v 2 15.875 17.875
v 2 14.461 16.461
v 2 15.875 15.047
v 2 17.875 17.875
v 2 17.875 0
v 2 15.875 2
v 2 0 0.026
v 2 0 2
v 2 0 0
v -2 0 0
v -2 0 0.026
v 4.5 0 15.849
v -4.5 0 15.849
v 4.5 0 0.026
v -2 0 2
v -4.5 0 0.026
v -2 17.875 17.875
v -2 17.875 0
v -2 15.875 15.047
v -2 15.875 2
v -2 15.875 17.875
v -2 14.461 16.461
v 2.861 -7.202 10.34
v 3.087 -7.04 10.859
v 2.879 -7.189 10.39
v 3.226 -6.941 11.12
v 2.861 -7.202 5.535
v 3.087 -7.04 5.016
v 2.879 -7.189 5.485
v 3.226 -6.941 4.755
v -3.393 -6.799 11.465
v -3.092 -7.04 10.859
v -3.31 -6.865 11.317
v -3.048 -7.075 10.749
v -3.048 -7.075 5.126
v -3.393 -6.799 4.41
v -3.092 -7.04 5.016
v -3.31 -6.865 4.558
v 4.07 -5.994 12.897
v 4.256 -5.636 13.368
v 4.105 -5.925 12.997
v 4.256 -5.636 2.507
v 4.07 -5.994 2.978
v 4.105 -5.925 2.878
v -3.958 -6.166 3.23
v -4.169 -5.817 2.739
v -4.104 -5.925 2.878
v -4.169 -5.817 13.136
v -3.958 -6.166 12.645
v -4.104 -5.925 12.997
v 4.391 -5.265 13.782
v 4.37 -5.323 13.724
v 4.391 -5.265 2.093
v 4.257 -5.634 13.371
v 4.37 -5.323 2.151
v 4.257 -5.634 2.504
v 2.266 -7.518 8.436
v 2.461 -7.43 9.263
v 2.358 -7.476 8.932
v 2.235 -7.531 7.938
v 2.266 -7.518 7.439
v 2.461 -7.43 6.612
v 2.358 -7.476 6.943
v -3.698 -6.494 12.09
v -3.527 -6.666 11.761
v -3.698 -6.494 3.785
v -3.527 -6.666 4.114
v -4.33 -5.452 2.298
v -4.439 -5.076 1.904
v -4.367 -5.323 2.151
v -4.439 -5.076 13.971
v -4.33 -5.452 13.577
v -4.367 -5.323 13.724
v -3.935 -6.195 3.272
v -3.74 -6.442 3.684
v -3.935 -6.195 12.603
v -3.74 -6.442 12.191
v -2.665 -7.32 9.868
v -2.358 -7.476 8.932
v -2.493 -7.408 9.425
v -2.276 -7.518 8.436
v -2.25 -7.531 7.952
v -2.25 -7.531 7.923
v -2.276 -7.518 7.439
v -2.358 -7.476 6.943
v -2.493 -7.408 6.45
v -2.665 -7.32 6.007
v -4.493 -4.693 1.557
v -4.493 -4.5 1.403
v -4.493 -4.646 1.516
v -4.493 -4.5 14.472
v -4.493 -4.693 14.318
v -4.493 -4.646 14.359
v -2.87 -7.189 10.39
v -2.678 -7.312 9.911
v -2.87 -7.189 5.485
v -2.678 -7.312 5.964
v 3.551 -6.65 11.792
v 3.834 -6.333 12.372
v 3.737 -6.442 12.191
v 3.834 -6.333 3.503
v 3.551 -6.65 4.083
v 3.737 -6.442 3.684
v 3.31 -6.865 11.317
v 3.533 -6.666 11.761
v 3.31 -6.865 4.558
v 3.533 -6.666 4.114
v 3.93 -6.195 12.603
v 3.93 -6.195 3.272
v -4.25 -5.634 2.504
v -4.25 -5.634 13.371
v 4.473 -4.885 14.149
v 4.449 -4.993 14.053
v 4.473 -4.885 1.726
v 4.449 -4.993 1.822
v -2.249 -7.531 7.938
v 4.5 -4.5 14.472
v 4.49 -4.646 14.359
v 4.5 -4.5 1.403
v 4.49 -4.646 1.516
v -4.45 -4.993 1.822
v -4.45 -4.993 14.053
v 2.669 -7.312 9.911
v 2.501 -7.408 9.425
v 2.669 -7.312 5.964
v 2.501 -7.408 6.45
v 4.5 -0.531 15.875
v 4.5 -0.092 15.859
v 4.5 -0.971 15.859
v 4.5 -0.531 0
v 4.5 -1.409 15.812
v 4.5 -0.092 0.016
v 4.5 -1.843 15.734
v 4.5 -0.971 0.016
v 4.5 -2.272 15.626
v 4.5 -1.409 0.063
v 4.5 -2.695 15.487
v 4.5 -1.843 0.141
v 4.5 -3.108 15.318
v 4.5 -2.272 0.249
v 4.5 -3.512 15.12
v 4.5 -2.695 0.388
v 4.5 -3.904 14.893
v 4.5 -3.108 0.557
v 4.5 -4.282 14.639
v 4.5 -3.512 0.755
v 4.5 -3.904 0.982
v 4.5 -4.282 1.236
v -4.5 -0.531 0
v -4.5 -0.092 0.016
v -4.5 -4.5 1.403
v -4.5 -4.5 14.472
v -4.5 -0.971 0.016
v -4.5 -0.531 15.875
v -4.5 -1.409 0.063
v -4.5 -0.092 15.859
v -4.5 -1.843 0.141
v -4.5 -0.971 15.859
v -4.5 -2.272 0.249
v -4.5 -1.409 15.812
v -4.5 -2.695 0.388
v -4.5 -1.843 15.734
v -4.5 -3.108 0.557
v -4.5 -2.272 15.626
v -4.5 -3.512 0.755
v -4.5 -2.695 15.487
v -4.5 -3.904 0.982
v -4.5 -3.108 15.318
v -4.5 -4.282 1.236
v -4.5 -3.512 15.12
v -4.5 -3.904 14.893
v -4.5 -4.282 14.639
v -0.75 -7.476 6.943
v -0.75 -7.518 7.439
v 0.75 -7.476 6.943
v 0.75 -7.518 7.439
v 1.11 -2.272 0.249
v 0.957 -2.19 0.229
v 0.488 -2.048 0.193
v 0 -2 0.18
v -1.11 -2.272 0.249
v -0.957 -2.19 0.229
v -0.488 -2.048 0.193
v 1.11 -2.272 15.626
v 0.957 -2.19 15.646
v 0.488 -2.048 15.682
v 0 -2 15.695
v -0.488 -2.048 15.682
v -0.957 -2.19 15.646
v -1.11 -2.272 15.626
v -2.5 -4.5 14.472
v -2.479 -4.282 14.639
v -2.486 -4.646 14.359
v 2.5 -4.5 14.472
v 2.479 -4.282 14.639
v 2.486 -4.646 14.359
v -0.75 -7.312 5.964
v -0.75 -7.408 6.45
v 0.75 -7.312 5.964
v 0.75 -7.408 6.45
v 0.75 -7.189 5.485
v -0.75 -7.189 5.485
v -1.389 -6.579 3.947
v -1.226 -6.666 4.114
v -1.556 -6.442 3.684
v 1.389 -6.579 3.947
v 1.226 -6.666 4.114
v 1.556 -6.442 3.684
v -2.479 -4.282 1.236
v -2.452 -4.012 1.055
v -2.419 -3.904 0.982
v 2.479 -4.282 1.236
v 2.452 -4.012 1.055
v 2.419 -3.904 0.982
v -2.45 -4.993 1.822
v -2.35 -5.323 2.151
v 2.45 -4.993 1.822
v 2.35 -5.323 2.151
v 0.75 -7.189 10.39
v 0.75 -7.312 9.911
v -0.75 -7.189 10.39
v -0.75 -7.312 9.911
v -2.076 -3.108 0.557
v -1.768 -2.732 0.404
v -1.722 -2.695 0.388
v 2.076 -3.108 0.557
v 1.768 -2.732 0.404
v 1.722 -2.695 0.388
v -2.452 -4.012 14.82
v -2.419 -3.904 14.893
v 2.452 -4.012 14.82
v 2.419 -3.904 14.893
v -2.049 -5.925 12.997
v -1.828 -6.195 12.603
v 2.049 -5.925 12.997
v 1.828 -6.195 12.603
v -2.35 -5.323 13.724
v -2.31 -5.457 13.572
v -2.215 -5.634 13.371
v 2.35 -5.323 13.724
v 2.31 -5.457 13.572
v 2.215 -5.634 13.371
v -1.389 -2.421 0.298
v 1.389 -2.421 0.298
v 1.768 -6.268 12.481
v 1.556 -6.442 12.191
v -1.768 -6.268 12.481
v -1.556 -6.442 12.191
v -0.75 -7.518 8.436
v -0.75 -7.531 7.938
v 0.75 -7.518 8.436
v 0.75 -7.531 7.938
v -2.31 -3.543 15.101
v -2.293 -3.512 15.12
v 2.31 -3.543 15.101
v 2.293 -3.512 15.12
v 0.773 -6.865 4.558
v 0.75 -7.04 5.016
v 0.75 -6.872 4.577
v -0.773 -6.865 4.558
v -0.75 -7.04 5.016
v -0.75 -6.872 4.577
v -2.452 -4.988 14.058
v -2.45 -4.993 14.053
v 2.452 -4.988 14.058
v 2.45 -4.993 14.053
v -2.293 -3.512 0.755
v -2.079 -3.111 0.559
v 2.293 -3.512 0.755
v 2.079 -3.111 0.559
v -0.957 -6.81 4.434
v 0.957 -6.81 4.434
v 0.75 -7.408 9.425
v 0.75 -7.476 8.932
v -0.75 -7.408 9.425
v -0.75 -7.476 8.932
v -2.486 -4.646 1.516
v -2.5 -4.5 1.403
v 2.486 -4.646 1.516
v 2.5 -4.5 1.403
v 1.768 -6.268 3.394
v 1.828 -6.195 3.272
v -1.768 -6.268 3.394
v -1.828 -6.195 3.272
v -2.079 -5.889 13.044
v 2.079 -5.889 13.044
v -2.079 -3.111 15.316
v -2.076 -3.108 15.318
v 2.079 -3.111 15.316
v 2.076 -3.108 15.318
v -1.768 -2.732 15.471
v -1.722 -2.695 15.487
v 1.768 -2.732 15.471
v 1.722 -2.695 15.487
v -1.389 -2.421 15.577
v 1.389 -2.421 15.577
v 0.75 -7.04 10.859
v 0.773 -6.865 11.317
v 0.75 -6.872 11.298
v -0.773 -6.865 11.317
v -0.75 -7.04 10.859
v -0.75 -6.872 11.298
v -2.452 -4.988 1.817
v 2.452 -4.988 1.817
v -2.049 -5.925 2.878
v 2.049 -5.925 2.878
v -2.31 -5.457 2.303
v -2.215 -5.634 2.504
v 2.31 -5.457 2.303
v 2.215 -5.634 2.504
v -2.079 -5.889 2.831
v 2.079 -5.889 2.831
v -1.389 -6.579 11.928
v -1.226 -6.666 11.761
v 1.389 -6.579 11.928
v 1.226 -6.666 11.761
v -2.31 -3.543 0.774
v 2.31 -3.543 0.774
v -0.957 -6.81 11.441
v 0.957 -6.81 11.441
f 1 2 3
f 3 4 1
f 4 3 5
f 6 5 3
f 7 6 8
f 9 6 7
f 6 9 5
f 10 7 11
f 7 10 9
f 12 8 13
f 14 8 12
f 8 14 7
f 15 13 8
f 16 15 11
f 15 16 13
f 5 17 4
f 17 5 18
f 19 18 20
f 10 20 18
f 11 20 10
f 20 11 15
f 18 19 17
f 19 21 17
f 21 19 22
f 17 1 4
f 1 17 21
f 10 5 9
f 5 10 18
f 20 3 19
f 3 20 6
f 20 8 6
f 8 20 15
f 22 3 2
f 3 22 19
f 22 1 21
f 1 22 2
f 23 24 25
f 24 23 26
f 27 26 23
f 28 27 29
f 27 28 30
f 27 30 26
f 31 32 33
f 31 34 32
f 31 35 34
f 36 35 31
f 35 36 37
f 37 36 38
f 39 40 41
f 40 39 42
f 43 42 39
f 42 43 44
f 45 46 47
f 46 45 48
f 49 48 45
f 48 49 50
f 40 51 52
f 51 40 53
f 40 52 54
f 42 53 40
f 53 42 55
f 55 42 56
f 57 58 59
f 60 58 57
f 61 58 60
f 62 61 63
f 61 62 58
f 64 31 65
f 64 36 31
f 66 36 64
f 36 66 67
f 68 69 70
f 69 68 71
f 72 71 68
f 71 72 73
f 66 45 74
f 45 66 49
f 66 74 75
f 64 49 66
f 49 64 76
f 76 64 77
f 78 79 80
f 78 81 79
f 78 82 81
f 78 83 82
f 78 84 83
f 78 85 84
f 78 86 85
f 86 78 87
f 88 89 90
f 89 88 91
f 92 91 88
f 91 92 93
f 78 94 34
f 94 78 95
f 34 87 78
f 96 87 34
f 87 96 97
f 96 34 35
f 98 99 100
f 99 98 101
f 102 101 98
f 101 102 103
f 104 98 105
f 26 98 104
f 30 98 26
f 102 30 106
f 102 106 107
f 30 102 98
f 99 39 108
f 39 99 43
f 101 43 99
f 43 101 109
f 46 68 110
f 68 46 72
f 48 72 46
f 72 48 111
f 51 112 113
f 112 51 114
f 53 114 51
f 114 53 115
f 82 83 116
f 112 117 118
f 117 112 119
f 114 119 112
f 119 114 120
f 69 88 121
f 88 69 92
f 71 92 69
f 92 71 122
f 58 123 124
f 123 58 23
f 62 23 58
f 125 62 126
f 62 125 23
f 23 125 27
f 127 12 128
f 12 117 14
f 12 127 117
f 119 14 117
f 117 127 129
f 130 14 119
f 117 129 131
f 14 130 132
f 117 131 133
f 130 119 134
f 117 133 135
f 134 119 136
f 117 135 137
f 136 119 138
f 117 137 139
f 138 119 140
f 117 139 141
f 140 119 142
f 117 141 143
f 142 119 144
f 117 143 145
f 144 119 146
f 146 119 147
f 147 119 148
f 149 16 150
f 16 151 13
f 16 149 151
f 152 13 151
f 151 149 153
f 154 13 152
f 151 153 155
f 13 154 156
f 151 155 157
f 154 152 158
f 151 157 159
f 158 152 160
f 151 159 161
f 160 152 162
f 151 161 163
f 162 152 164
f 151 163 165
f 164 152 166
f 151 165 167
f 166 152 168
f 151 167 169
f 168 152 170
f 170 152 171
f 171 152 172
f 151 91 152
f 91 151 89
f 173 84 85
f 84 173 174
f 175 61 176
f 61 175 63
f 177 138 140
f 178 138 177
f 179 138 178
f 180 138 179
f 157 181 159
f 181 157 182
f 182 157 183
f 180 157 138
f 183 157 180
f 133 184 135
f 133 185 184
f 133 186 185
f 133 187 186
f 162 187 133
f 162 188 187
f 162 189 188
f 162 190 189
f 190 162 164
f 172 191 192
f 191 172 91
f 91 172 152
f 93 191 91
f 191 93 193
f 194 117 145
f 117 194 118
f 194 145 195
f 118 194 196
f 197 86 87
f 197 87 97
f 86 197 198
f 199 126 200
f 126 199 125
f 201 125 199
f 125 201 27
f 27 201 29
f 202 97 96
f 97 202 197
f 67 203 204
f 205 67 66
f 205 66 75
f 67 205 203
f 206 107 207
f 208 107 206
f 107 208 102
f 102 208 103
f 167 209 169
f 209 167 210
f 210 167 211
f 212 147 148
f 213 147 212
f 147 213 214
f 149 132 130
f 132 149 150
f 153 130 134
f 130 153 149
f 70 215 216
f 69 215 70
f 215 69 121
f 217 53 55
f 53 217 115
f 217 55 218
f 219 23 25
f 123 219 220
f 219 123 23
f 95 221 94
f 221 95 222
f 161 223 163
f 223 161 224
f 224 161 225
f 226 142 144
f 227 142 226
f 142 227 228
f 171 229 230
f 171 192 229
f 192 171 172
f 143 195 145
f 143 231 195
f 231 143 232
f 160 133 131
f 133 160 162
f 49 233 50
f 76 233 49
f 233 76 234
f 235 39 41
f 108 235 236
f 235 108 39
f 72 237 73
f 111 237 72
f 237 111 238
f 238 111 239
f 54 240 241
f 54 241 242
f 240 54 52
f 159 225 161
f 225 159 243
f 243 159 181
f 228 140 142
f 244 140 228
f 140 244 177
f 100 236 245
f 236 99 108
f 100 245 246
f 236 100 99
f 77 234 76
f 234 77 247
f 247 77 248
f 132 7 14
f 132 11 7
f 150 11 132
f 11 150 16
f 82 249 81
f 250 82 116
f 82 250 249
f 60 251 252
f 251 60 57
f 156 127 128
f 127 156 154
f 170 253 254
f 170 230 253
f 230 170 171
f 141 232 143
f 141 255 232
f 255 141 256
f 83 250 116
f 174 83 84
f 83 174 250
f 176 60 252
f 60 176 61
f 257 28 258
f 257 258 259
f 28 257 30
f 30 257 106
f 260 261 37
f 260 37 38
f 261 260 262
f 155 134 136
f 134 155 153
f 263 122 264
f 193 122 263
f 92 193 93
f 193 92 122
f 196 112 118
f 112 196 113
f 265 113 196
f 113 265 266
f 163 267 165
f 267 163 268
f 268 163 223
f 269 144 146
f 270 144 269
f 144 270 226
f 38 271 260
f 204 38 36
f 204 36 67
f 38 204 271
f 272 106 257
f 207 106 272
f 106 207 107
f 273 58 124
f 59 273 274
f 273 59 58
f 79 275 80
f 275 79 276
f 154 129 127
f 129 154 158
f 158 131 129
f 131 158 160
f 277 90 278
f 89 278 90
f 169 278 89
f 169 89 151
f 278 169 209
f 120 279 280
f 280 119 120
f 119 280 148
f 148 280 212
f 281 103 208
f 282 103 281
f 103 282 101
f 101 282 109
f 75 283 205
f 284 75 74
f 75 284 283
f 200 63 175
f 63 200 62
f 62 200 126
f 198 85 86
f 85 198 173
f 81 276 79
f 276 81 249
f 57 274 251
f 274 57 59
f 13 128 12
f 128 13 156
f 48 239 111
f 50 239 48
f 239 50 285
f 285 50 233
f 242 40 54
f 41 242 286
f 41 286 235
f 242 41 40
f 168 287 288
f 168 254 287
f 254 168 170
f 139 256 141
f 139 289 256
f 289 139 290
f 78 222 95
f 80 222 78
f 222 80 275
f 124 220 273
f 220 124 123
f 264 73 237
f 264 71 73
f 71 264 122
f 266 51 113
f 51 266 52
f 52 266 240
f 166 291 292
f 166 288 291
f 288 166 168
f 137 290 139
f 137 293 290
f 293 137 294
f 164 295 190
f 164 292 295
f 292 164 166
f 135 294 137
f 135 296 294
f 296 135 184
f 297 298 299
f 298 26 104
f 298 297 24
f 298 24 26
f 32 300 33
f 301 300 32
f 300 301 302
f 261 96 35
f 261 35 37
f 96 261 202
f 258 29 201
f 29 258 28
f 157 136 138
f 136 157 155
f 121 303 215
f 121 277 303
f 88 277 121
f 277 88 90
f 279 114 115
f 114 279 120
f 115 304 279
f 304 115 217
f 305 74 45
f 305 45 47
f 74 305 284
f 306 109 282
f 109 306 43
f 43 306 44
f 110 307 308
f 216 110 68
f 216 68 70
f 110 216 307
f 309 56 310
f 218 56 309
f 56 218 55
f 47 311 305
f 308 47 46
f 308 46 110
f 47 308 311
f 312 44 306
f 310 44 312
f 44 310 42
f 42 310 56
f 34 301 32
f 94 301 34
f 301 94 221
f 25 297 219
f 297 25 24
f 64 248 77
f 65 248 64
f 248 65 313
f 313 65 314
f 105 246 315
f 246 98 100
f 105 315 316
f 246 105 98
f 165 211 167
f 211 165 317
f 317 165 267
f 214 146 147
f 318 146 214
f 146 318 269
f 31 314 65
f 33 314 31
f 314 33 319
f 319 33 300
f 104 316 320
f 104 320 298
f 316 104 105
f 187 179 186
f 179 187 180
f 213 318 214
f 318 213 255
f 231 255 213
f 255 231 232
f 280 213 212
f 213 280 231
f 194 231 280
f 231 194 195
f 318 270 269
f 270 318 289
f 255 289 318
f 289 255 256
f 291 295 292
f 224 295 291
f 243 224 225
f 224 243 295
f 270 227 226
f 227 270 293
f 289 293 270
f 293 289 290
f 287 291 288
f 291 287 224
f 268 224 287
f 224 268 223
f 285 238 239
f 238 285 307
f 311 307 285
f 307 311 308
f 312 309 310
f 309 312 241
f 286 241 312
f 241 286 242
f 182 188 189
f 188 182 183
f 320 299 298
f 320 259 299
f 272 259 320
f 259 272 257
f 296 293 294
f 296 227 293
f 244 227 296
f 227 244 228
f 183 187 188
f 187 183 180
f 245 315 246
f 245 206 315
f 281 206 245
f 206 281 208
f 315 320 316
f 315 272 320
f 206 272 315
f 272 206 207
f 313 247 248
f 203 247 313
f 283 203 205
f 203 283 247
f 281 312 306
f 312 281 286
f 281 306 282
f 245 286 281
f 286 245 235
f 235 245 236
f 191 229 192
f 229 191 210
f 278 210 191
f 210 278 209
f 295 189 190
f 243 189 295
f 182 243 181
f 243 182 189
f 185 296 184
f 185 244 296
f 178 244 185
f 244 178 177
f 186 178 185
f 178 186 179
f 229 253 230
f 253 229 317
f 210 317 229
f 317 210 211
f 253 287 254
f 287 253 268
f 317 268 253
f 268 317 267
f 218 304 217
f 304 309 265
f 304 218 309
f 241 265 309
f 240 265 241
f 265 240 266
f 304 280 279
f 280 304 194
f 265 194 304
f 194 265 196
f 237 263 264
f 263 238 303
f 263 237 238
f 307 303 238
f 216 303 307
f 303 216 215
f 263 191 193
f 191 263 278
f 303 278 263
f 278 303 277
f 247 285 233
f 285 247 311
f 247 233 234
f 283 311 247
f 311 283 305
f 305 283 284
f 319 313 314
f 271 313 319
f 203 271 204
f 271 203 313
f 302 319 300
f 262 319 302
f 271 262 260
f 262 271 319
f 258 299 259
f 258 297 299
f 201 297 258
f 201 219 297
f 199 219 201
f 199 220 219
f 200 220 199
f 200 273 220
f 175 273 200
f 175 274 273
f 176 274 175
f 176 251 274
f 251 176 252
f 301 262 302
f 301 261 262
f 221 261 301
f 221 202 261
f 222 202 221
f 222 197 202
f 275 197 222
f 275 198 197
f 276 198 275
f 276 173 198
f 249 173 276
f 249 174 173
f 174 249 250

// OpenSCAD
shelf_thickness = 5/8 * 25.4; // 5/8" to mm
wall_thickness = 2;
cable_diameter = 4;
clip_depth = shelf_thickness;

$fa=0.5; // default minimum facet angle is now 0.5
$fs=0.5; // default minimum facet size is now 0.5 mm

// shelf
% translate([-50,0,wall_thickness]) cube([100, shelf_thickness, 100]);

module clip(width, depth, height, tooth) {
	// what we're clipping onto
	% cube([width, depth, height]);

	difference() {
		translate([0,-wall_thickness,-wall_thickness]) cube([width, depth+wall_thickness, height+wall_thickness]);
		translate([-1,0,0]) cube([width+2, depth+1, height+1]);
	}

	// tooth
	offset = tooth/sqrt(2);
	translate([width/2,depth-offset,0]) rotate([45,0,0])
		cube([width, tooth, tooth], center=true);
}

translate([0, shelf_thickness, 0])
translate([0, 0, wall_thickness])  // level with print bed
rotate([90,0,0])                   // lie on it's back
translate([-cable_diameter/2,0,0]) // center on x
clip(cable_diameter, clip_depth, shelf_thickness, wall_thickness);

module squared_cylinder(r1, r2, h) {
	cylinder(r1=r1, r2=r2, h=h);
	intersection() {
	rotate([0,0,45]) scale([sqrt(2),sqrt(2),1])
		cylinder(r1=r1, r2=r2, h=h, $fn=4);
		translate([-(r1+r2),0,-1])
			cube([(r1+r2)*2,(r1+r2)*2,h+2]);
	}
}

module holder(channel_rad, gap, length) {
	holder_rad = channel_rad + wall_thickness;
	translate([0, -holder_rad, 0]) // set origin
	difference () {
		intersection() {
			union () {
				
				// upper cylinder
				scale([1, 1 - wall_thickness/holder_rad/2, 1])
				cylinder(r=channel_rad + wall_thickness, h=clip_depth);

				// bottom rectangle
				translate([-holder_rad,0,0]) cube([holder_rad*2, holder_rad, length]);
			}

			translate([0, 0, length/2])
			scale([1, (holder_rad*2-wall_thickness) / length*2, 1])
			translate([0,holder_rad,0])
			rotate([0, 90, 0])
				cylinder(r=length/2, h=holder_rad*2+2, center = true);
		}
		// channel
		translate([0,0,-1]) cylinder(r=channel_rad, h=length+2);
		// gap
		translate([0, -(channel_rad+1), length/2]) cube([gap/2, wall_thickness+2, length+2], center=true);
	}
}

holder((cable_diameter+1)/2, cable_diameter-1, clip_depth);
